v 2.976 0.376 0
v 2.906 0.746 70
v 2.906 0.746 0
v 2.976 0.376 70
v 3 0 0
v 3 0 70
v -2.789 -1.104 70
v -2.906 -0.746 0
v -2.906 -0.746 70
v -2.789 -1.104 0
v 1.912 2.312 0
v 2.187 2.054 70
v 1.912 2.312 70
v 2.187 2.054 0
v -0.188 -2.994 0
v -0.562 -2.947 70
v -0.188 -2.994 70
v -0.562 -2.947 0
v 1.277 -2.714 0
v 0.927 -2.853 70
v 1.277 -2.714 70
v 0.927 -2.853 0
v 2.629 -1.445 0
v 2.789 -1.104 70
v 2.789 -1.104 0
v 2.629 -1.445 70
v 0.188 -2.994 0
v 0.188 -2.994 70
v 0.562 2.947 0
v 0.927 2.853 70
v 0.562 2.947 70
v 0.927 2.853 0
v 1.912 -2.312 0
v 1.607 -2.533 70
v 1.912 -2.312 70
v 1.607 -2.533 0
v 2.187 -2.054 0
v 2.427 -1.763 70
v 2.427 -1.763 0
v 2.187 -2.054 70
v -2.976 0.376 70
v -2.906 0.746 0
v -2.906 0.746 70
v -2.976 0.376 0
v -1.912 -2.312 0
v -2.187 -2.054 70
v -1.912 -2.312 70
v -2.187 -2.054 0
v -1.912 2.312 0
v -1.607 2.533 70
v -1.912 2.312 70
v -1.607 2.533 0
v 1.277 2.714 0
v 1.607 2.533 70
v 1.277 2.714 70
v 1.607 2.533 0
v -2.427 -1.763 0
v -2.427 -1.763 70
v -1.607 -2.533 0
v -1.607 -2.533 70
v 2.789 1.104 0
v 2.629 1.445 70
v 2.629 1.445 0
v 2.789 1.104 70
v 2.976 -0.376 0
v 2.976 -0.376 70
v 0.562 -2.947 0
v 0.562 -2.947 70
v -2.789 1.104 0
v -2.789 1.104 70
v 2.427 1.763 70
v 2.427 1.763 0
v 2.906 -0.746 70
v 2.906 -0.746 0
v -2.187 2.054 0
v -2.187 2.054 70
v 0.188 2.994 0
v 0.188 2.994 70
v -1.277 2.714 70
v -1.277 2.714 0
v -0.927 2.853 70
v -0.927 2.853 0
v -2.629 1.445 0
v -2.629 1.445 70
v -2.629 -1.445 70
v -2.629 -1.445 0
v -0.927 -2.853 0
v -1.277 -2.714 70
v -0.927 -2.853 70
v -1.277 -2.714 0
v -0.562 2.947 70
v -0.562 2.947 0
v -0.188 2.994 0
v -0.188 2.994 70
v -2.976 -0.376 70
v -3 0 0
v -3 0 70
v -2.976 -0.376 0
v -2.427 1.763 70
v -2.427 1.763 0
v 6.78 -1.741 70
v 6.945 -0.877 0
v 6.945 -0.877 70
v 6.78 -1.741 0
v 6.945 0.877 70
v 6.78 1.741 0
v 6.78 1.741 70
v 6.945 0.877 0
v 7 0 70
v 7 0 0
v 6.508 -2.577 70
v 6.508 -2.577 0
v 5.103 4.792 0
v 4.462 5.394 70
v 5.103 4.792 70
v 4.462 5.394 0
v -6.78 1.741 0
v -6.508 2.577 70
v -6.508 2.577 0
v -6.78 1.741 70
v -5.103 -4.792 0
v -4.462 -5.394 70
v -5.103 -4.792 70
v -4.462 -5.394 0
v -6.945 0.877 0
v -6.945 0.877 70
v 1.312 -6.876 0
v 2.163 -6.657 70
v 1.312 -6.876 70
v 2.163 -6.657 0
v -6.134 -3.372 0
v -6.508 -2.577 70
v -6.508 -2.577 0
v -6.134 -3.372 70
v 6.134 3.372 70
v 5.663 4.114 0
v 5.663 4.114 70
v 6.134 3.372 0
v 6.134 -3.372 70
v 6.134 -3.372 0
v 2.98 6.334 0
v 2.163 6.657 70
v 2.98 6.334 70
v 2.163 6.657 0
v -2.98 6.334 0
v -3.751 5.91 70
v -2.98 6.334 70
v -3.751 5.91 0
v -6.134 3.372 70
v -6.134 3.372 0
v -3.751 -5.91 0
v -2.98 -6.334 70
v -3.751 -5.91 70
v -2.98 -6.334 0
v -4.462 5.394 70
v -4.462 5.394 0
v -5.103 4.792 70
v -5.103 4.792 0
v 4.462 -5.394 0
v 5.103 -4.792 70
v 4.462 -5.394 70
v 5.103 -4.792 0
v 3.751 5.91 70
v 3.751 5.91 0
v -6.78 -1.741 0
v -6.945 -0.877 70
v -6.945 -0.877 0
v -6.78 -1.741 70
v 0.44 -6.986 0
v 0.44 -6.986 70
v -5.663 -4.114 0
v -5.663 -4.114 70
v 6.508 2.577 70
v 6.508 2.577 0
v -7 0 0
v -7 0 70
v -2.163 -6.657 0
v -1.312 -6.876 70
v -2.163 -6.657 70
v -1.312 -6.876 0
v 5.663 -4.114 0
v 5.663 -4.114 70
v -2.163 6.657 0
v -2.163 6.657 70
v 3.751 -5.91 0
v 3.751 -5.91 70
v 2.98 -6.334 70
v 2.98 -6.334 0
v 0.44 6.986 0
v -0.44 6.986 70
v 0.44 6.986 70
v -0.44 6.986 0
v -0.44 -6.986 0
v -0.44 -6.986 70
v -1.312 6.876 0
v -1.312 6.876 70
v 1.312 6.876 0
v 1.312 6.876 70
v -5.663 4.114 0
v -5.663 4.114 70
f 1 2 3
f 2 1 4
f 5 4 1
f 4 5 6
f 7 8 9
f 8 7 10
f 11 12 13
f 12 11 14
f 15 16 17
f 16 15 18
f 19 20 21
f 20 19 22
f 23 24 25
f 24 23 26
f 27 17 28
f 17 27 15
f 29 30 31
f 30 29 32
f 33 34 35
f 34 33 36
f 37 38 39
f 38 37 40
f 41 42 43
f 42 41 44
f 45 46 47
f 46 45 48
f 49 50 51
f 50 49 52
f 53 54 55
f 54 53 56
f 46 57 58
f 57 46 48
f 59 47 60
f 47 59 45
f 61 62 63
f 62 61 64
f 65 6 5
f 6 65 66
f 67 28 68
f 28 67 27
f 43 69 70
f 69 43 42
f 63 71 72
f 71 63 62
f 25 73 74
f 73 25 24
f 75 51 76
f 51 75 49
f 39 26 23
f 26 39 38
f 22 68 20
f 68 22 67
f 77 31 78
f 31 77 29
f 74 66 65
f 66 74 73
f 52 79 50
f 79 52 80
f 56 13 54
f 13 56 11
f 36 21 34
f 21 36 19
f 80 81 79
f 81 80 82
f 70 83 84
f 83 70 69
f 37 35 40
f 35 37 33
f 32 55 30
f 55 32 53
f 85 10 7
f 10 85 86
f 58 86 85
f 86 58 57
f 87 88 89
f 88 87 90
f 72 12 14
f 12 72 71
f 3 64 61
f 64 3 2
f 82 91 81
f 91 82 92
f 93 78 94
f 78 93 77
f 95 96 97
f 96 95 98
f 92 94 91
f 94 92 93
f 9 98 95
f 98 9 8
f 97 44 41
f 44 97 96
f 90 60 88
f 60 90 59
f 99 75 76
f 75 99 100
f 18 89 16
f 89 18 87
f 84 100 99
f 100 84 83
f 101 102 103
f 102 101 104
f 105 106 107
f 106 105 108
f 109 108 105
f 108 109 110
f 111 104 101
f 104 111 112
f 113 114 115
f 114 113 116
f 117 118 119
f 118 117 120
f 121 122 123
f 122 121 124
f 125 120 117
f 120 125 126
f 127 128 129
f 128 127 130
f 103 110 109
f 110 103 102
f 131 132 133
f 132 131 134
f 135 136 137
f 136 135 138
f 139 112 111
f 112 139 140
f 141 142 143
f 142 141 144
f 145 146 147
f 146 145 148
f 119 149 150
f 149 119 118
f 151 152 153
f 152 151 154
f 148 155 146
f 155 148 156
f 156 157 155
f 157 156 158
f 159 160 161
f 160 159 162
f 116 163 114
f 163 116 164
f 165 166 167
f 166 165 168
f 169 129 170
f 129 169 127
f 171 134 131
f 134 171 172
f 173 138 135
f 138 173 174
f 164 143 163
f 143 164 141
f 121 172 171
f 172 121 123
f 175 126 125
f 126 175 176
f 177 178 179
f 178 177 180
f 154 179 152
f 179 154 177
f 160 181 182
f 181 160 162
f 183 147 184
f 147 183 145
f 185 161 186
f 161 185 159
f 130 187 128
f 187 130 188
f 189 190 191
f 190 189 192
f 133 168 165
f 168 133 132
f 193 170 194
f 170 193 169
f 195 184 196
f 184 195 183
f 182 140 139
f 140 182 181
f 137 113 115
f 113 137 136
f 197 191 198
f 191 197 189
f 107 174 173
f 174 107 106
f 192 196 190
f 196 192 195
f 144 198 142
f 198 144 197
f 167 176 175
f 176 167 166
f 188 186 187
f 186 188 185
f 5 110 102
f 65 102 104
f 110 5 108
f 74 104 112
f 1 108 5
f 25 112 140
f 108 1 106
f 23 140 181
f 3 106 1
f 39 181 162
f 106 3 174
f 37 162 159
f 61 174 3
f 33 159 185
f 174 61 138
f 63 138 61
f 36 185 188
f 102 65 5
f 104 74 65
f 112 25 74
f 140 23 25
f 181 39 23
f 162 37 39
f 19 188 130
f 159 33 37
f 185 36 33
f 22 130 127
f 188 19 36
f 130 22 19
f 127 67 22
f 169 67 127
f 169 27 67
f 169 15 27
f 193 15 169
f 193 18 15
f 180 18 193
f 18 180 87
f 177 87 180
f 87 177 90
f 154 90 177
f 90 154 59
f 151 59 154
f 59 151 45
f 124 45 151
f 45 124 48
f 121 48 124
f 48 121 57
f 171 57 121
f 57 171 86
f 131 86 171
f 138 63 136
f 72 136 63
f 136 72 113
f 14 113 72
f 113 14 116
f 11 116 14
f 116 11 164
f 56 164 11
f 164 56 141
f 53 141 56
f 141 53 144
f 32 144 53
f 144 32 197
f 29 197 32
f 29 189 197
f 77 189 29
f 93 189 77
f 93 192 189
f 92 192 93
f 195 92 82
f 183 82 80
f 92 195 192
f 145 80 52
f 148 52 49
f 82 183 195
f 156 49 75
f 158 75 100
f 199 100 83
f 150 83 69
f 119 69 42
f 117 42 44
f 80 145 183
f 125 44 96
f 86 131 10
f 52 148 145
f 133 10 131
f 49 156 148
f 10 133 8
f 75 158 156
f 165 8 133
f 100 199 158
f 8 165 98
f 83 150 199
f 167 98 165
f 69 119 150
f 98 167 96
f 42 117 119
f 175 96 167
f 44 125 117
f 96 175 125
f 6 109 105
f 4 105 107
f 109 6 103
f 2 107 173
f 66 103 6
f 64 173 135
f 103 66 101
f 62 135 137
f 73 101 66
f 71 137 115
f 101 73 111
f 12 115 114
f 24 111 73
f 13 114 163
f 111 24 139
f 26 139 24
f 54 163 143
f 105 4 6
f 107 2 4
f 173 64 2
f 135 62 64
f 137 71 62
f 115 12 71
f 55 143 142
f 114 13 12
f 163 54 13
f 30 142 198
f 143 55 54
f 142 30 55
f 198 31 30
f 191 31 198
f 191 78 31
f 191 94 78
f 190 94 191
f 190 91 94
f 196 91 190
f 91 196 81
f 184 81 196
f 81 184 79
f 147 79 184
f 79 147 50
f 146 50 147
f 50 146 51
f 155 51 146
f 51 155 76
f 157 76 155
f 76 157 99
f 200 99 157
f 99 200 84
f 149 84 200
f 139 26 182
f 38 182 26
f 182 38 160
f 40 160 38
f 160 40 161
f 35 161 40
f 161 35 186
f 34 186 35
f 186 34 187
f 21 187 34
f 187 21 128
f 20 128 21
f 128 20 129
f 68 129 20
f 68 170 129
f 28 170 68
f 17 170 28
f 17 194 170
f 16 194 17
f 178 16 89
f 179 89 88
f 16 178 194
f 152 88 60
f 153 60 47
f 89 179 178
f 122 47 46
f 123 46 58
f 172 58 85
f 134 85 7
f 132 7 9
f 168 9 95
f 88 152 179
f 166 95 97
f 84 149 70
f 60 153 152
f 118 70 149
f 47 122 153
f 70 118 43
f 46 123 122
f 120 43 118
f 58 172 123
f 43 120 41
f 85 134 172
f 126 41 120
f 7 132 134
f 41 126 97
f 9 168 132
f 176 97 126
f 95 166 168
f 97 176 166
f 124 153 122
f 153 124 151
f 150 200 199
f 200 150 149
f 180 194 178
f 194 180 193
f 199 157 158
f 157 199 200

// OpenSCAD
$fn = 50;

difference() {
	union() {
		cylinder(h = 70, r = 7.0);
	}
	union() {
		translate(v = [0, 0, -100]) {
			cylinder(h = 200, r = 3.0);
		}
		translate(v = [0, 0, -100]) {
			cylinder(h = 200, r = 1.5);
		}
	}
}
